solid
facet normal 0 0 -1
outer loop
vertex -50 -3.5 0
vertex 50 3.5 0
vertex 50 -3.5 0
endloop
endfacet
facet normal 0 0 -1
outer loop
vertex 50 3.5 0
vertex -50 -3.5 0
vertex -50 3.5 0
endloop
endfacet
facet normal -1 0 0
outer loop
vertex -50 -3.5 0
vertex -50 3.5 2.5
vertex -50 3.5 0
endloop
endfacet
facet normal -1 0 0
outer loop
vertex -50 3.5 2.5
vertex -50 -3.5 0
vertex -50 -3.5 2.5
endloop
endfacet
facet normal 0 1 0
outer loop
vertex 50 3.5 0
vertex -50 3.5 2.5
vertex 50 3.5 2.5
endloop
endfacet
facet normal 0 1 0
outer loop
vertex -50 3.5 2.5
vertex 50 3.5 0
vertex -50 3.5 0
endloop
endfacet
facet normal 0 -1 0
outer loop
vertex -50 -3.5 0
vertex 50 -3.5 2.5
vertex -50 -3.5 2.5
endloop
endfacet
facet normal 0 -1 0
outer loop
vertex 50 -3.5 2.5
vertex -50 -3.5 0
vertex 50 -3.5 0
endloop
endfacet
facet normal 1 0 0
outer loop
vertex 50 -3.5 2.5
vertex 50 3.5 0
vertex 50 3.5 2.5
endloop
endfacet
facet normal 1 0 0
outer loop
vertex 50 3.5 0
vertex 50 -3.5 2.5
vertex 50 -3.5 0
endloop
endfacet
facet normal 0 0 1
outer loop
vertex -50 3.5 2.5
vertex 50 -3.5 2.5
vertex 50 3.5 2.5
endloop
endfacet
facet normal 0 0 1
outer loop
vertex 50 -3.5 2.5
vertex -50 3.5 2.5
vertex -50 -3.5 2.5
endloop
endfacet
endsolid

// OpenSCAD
module linear_guide_rail() {
    difference() {
        // Main body of the rail
        translate([-50, -3.5, -2.5])
            cube([100, 7, 5]);
        
        // Cutouts for the rail
        translate([-50, -3.5, -2.5])
            for (i = [0:10:90])
                translate([i, 0, 0])
                    cube([10, 7, 2.5]);
    }
}

linear_guide_rail();
